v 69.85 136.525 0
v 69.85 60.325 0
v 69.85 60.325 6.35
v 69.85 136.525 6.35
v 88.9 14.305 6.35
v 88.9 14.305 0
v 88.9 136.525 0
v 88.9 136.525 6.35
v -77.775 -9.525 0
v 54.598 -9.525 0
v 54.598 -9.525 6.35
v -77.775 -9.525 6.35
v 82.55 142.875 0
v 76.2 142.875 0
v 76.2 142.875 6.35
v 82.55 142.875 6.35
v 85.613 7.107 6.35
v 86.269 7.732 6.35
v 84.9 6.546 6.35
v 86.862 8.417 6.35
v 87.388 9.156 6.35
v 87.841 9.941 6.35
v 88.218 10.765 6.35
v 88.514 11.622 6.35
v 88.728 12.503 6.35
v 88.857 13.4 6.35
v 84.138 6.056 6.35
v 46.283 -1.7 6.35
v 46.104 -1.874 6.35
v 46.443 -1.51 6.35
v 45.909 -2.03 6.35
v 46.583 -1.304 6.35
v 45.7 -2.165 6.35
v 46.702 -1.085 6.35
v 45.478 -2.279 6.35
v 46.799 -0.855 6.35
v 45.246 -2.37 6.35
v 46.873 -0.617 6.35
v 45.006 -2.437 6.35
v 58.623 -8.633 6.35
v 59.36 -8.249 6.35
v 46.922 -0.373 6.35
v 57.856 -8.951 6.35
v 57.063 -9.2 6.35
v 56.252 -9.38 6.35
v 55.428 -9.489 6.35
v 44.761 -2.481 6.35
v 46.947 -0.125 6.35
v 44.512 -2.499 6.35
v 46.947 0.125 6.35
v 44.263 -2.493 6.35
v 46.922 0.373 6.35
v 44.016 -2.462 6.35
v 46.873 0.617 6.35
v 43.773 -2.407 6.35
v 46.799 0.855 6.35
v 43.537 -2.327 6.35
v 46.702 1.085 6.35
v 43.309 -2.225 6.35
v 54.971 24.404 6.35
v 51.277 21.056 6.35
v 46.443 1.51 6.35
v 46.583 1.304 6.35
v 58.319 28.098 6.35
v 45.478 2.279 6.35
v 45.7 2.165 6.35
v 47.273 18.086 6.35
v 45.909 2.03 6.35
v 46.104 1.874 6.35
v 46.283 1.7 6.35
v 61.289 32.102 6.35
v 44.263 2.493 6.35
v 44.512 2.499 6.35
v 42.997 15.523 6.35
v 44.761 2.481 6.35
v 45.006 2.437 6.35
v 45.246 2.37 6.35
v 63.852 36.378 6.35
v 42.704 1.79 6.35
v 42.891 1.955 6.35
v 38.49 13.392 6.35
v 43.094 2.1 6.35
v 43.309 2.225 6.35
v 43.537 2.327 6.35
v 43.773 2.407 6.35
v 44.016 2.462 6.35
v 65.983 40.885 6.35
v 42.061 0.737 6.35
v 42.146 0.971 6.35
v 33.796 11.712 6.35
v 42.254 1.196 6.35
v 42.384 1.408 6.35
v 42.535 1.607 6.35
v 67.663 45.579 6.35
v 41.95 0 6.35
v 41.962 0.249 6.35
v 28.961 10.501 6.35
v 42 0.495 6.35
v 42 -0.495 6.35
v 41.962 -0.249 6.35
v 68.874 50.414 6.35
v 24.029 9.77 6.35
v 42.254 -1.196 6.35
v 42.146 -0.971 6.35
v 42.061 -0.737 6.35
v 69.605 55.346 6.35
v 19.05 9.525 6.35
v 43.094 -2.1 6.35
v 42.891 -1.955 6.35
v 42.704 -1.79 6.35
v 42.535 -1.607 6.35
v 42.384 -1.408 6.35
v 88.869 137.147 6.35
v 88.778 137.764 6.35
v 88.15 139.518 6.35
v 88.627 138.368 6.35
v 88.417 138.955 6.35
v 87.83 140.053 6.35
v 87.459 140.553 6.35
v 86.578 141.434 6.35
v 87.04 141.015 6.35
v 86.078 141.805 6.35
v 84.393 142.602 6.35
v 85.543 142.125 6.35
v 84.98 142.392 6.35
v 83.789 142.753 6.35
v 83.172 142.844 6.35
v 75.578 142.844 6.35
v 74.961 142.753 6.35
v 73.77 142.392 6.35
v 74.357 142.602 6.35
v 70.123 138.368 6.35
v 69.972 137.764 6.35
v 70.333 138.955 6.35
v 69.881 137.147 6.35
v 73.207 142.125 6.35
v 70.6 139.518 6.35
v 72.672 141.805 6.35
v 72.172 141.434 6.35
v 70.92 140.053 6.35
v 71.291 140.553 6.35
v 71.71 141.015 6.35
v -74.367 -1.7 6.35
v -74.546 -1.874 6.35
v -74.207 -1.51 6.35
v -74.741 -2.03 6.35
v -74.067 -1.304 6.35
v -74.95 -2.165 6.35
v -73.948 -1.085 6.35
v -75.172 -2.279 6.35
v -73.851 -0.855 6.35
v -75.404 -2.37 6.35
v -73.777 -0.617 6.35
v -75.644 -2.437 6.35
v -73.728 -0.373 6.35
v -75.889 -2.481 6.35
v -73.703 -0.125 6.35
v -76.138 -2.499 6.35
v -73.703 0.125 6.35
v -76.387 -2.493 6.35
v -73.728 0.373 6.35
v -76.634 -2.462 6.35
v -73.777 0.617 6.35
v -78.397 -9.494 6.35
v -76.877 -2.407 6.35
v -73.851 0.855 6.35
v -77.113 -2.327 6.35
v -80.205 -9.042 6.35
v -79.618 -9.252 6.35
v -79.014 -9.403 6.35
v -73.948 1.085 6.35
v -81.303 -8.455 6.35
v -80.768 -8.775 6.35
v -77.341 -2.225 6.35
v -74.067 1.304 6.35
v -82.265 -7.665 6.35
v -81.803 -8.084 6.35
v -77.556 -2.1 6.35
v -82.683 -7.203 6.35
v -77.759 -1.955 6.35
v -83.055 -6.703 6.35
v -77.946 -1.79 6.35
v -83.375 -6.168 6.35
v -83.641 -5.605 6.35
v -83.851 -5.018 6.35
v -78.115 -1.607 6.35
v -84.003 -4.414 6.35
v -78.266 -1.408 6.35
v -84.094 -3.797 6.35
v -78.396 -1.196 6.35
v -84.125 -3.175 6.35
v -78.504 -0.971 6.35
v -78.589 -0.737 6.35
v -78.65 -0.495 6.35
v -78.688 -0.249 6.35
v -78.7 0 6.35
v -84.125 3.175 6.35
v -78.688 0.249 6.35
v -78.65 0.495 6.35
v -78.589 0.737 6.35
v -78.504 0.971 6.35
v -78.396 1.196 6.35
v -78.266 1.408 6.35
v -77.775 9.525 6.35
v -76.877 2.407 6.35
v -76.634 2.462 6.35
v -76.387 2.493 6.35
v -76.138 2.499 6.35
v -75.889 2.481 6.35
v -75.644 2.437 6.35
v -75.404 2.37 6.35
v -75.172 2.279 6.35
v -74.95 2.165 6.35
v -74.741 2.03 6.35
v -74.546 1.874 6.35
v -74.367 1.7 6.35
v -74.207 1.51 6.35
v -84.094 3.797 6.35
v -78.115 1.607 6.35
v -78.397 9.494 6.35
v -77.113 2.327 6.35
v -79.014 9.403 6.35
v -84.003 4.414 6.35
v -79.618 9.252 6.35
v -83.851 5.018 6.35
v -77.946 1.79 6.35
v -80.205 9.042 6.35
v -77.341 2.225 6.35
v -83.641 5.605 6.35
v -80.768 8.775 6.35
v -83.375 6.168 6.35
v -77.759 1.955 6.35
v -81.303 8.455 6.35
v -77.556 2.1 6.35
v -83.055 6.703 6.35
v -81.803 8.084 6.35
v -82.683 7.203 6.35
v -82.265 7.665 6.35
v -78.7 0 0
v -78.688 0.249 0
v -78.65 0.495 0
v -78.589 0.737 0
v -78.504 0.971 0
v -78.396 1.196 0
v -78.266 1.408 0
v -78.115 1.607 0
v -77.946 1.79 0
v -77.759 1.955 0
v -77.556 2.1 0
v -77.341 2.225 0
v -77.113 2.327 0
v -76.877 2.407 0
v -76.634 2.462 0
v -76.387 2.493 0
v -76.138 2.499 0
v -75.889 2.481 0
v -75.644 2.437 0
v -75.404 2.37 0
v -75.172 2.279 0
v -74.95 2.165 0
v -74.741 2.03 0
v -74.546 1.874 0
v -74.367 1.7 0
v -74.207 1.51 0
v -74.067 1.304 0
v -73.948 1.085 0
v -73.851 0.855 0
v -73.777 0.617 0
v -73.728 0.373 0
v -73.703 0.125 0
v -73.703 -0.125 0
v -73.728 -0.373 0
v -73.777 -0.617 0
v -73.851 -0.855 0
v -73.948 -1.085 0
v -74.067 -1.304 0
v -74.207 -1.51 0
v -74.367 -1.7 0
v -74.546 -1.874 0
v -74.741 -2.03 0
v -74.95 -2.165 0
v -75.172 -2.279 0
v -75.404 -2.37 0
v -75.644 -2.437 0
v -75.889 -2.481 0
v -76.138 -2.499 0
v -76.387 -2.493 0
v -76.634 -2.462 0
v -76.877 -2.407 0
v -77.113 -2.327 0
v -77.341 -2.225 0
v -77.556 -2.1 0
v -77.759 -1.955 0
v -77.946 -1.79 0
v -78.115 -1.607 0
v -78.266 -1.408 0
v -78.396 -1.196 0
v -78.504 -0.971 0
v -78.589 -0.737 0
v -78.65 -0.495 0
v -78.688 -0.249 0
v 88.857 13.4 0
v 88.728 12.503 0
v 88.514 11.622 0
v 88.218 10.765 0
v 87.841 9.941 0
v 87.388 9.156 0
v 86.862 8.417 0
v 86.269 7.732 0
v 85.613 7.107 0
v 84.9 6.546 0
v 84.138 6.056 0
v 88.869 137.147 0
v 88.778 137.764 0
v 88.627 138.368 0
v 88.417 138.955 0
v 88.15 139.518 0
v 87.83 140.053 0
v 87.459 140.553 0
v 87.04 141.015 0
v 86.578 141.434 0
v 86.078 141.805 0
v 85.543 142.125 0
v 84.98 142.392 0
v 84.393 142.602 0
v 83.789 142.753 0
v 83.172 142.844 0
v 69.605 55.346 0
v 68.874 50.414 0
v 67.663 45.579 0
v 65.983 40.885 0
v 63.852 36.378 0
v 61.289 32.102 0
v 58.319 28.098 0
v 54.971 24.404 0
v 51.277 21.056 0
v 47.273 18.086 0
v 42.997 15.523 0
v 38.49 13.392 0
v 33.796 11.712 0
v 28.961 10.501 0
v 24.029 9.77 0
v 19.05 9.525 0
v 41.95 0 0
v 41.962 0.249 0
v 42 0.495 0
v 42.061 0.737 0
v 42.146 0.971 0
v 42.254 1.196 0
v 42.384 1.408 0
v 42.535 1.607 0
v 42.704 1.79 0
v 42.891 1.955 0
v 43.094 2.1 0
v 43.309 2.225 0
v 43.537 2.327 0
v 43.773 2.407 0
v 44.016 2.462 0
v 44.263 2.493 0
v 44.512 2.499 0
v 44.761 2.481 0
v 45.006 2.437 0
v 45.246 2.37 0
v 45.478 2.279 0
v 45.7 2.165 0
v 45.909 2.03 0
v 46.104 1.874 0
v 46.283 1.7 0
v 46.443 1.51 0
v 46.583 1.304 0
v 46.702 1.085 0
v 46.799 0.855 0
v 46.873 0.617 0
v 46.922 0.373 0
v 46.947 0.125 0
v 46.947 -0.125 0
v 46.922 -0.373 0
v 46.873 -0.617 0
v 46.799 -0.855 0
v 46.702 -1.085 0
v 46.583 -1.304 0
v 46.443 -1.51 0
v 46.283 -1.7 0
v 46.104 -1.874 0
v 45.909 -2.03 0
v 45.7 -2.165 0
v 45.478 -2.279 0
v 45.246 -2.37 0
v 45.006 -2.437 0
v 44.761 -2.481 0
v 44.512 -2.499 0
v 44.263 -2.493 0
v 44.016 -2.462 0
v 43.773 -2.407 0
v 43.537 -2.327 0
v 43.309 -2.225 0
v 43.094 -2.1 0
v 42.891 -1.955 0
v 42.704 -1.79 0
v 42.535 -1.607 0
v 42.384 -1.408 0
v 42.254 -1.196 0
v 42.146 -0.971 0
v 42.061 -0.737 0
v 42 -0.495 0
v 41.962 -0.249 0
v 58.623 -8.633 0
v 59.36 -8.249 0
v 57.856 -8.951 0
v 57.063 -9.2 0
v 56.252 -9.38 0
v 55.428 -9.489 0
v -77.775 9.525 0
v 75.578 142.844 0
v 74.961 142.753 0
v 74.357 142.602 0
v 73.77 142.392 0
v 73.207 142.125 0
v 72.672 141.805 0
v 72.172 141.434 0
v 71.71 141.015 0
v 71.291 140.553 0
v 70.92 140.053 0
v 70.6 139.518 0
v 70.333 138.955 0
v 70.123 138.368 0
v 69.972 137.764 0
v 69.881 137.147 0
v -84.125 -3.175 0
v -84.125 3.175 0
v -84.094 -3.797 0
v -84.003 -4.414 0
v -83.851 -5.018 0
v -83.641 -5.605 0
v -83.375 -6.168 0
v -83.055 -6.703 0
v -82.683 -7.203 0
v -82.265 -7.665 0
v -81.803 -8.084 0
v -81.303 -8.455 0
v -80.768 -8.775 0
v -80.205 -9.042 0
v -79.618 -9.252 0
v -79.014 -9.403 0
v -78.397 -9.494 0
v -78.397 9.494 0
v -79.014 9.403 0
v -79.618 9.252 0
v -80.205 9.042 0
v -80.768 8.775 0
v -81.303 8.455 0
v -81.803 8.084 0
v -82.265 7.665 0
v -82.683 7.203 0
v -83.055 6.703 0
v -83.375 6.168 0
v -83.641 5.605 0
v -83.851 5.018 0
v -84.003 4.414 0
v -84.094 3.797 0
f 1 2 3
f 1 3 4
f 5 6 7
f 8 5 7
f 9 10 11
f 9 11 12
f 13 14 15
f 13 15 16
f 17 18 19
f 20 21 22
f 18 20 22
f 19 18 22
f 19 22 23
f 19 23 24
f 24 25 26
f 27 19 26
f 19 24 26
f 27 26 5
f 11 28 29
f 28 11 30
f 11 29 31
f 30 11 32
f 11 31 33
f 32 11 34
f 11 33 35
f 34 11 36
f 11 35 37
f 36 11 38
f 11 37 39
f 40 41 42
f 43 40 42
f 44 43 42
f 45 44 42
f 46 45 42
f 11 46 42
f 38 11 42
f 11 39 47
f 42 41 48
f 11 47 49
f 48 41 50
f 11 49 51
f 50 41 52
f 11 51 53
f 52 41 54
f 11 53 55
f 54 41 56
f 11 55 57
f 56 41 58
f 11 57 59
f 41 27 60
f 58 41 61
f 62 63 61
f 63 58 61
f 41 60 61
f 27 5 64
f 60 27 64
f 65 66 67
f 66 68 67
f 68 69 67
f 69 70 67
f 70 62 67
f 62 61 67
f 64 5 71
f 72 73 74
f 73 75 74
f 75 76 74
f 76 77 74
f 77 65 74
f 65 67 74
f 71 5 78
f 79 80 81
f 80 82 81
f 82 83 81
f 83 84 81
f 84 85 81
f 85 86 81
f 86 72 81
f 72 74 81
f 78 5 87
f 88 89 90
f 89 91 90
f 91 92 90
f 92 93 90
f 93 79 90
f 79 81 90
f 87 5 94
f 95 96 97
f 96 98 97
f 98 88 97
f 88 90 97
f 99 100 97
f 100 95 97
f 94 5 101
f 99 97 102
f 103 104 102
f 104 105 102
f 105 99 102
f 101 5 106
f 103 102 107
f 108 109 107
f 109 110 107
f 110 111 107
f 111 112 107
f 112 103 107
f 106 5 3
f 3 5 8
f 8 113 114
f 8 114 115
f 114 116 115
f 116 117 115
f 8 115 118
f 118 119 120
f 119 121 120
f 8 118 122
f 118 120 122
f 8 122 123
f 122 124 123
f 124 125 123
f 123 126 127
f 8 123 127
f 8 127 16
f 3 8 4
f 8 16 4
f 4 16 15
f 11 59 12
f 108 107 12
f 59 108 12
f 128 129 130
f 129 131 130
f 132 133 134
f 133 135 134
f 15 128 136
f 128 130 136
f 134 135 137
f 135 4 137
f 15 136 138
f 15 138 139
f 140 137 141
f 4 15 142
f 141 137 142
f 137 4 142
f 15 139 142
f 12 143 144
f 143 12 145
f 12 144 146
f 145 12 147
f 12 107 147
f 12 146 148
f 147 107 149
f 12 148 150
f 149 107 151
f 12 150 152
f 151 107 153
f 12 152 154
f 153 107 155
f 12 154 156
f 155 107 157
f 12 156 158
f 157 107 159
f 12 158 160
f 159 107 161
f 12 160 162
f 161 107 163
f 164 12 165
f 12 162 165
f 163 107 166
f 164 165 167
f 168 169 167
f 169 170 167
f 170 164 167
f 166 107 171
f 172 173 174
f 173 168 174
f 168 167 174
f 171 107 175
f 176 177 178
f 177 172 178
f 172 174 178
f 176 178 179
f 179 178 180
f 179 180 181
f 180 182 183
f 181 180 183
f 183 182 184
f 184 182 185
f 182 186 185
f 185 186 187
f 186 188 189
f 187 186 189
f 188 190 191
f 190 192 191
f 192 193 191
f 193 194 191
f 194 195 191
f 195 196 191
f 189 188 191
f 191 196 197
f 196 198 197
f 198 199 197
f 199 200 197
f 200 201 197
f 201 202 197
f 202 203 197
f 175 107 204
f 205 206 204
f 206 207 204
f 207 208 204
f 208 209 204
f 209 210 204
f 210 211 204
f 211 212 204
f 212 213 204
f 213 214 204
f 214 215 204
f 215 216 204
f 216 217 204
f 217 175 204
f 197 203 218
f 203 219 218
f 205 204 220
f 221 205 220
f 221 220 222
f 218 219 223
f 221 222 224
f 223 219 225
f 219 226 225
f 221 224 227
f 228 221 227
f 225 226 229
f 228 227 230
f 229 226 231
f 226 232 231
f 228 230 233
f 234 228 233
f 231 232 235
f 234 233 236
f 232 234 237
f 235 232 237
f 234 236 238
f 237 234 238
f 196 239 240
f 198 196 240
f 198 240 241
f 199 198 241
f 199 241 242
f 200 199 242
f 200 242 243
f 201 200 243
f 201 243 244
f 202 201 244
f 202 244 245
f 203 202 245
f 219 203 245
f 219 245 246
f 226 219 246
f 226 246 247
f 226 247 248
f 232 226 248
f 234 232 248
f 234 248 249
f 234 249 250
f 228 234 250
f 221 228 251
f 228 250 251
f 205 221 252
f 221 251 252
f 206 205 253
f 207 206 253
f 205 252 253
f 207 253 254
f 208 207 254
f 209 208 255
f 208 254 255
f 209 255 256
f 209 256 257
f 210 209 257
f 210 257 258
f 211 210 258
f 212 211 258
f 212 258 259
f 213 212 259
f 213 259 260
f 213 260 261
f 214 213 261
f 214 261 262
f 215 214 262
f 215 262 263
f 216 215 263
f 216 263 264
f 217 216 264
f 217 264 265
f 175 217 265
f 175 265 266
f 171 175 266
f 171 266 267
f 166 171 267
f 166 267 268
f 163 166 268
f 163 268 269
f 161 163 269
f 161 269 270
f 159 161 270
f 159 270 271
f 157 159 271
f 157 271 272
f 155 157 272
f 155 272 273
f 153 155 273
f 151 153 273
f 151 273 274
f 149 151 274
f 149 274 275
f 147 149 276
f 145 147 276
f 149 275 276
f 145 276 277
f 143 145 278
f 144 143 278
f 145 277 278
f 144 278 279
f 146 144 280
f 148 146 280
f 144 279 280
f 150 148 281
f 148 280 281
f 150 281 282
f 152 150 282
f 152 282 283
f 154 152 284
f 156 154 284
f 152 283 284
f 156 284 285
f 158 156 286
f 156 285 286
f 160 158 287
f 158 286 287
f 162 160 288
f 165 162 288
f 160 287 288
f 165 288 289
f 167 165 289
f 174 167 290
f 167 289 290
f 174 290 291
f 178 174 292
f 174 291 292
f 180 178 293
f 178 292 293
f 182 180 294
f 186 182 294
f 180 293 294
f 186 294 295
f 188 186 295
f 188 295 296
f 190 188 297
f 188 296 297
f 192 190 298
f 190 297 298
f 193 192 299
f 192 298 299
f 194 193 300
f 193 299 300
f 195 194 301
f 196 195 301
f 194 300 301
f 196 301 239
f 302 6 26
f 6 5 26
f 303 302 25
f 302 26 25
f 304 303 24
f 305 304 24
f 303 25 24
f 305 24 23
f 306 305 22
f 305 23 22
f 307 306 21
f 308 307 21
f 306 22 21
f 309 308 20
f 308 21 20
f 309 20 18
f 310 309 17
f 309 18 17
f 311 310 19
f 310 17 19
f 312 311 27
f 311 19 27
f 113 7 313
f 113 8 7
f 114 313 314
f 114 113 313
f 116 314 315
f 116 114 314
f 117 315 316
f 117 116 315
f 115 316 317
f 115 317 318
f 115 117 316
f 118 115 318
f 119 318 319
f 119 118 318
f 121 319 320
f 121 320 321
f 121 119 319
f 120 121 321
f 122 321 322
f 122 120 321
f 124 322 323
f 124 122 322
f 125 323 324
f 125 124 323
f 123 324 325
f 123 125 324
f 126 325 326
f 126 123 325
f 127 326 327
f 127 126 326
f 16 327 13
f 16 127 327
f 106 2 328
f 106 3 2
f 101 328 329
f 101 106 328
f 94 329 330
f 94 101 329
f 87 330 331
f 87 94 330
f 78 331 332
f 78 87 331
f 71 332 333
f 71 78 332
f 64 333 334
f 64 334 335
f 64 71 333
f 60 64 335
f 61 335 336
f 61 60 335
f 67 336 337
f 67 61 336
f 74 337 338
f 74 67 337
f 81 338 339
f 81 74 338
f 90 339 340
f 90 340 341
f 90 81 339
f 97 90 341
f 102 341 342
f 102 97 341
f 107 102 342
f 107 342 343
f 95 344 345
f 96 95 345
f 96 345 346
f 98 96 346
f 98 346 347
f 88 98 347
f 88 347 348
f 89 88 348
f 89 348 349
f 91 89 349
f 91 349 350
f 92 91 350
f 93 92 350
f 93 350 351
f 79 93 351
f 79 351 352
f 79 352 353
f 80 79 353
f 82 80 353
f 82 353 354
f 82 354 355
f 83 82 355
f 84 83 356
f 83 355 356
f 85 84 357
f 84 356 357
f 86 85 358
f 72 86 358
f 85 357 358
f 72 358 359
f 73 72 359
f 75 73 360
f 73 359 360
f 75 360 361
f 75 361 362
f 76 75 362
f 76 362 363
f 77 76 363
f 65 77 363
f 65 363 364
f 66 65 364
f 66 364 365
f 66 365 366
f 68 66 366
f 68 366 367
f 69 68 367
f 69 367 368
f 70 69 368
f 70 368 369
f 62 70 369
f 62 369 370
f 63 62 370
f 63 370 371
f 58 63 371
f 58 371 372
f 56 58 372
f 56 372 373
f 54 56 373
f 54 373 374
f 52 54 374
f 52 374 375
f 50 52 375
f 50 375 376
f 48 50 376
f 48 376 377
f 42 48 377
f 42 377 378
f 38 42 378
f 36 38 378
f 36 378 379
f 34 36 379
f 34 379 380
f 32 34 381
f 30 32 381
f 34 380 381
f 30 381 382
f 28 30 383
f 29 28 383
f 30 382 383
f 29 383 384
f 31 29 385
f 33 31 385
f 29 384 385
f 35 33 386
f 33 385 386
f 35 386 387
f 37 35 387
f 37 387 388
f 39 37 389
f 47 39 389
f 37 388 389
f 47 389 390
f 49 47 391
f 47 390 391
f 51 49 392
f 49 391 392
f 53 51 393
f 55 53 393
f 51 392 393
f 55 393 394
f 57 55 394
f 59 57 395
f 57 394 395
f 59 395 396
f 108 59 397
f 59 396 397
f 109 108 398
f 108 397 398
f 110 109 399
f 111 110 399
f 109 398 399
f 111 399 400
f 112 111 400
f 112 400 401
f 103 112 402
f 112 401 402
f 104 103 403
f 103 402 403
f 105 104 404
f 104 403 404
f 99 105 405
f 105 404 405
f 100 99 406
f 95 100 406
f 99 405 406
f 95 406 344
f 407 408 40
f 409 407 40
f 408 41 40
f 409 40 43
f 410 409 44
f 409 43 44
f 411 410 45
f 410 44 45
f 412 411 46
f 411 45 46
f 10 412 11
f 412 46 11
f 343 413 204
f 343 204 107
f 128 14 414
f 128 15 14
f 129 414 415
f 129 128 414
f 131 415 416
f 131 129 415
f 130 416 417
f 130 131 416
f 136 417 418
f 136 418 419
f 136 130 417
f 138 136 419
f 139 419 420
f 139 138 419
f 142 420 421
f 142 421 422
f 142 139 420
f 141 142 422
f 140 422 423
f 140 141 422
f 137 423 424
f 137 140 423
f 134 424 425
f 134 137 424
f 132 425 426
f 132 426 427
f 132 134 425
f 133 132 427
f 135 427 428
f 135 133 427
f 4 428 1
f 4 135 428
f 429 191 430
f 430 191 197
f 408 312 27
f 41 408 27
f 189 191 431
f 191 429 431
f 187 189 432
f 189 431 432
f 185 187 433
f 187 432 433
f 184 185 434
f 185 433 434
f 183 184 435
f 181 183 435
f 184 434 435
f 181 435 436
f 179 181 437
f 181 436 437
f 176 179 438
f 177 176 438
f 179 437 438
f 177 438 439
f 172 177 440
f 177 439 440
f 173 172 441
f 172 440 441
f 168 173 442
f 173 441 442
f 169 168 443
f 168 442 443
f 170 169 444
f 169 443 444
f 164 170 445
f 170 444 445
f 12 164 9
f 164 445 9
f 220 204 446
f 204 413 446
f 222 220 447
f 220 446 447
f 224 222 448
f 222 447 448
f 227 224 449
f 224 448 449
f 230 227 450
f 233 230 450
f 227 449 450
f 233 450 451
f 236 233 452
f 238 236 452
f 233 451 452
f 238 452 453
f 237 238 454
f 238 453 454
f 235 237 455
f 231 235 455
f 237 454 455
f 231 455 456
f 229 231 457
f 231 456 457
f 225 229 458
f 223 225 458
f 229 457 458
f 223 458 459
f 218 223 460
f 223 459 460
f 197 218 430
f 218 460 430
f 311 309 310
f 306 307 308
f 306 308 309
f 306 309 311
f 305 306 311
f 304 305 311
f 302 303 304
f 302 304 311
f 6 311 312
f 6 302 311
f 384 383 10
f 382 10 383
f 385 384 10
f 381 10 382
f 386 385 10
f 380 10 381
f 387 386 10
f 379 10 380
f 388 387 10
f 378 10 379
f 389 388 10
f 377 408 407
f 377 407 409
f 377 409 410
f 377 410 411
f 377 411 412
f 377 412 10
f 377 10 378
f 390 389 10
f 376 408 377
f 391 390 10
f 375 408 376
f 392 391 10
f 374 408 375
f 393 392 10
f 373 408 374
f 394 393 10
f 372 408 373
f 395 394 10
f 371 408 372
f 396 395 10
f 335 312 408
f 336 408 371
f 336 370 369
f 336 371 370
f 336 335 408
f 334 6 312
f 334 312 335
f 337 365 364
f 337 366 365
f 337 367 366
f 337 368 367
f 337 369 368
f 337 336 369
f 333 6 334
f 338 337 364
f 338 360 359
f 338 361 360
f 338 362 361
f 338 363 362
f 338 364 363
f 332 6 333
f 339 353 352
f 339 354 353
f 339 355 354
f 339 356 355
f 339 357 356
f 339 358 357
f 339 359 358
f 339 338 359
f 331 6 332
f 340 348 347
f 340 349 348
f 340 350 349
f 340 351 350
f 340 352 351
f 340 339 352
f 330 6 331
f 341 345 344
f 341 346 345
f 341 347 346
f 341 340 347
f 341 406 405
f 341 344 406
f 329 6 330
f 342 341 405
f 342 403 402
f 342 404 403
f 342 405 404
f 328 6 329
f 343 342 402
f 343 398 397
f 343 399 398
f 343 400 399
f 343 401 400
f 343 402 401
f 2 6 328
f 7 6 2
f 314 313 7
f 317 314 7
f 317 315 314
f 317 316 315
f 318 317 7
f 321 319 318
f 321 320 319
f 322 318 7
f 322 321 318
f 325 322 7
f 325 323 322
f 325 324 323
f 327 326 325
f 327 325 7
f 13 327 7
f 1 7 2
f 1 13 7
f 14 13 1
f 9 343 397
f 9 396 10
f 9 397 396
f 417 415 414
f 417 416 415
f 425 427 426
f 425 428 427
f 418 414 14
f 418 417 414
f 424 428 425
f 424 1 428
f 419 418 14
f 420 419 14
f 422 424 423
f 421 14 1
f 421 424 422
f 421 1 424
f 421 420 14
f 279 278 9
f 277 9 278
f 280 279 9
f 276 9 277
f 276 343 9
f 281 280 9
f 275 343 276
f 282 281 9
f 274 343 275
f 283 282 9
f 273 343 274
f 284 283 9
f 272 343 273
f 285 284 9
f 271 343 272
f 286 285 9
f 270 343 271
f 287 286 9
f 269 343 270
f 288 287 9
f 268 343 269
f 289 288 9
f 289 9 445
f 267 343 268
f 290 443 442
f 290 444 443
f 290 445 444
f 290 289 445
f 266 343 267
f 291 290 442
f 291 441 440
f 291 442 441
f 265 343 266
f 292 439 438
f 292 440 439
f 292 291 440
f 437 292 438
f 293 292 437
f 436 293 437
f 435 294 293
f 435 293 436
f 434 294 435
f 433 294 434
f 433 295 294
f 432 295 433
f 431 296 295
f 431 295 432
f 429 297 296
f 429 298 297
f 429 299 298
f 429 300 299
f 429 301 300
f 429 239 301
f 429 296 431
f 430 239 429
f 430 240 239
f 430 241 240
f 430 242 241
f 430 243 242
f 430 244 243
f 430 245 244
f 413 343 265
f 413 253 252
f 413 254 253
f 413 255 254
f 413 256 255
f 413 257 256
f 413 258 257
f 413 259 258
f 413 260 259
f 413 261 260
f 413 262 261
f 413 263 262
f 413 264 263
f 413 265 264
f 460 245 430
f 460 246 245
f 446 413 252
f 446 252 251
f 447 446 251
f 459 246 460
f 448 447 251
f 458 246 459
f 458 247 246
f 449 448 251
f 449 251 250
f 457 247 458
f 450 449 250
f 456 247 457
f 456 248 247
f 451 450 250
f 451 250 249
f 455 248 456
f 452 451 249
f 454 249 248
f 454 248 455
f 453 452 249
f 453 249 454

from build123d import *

# Parameters (mm, degrees)
BASE_FLANGE1_DEPTH    = 6.35
M6X1_0_TAPPED_HOLE1_D = 5
CHAMFER1_SIZE         = 31.75
CHAMFER1_SIZE2        = 18.330871047
EXTRUDE1_REACH        = 170.395
SKETCH5_W             = 4.7752
SKETCH5_H             = 19.05
FILLET1_R             = 6.35
FILLET2_R             = 50.8
FILLET3_R             = 9.525


# Sheet-metal steps are written as plain solids
with BuildPart() as part:
    # Sketch1 → Base-Flange1 (new body)
    with BuildSketch(Plane.XY):
        Polygon((-88.9, 9.525), (69.85, 9.525), (69.85, 142.875), (88.9, 142.875), (88.9, 9.525), (88.9, -9.525), (-88.9, -9.525), align=None)
    extrude(amount=BASE_FLANGE1_DEPTH)

    # M6x1.0 Tapped Hole1 (through all)
    with Locations(Plane.XY.offset(6.35)):
        with Locations((-76.2, 0), (44.45, 0)):
            Hole(M6X1_0_TAPPED_HOLE1_D / 2)

    # Chamfer1
    chamfer1_edges = [part.edges().sort_by_distance(p)[0] for p in [
        (88.9, -9.525, 3.175),
    ]]
    chamfer1_side = [part.faces().sort_by_distance(p)[0] for p in [
        (0, -9.525, 3.175),
    ]]
    chamfer(chamfer1_edges, length=CHAMFER1_SIZE, length2=CHAMFER1_SIZE2, reference=chamfer1_side[0])

    # Sketch5 → Extrude1 (cut, up to next)
    with BuildSketch(Plane.XY.offset(6.35), mode=Mode.PRIVATE) as extrude1_sk1:
        with Locations((-86.5124, 0)):
            Rectangle(SKETCH5_W, SKETCH5_H)
    extrude1_tool1 = extrude(extrude1_sk1.sketch, amount=-EXTRUDE1_REACH, mode=Mode.PRIVATE) & part.part
    add(extrude1_tool1.solids().sort_by_distance((-86.5124, 0, 6.35))[0], mode=Mode.SUBTRACT)

    # Fillet1
    fillet1_edges = [part.edges().sort_by_distance(p)[0] for p in [
        (69.85, 142.875, 3.175),
        (88.9, 142.875, 3.175),
        (-84.1248, 9.525, 3.175),
        (-84.1248, -9.525, 3.175),
    ]]
    fillet(fillet1_edges, radius=FILLET1_R)

    # Fillet2
    fillet2_edges = [part.edges().sort_by_distance(p)[0] for p in [
        (69.85, 9.525, 3.175),
    ]]
    fillet(fillet2_edges, radius=FILLET2_R)

    # Fillet3
    fillet3_edges = [part.edges().sort_by_distance(p)[0] for p in [
        (88.9, 8.805871047, 3.175),
        (57.15, -9.525, 3.175),
    ]]
    fillet(fillet3_edges, radius=FILLET3_R)


solid = part.part
